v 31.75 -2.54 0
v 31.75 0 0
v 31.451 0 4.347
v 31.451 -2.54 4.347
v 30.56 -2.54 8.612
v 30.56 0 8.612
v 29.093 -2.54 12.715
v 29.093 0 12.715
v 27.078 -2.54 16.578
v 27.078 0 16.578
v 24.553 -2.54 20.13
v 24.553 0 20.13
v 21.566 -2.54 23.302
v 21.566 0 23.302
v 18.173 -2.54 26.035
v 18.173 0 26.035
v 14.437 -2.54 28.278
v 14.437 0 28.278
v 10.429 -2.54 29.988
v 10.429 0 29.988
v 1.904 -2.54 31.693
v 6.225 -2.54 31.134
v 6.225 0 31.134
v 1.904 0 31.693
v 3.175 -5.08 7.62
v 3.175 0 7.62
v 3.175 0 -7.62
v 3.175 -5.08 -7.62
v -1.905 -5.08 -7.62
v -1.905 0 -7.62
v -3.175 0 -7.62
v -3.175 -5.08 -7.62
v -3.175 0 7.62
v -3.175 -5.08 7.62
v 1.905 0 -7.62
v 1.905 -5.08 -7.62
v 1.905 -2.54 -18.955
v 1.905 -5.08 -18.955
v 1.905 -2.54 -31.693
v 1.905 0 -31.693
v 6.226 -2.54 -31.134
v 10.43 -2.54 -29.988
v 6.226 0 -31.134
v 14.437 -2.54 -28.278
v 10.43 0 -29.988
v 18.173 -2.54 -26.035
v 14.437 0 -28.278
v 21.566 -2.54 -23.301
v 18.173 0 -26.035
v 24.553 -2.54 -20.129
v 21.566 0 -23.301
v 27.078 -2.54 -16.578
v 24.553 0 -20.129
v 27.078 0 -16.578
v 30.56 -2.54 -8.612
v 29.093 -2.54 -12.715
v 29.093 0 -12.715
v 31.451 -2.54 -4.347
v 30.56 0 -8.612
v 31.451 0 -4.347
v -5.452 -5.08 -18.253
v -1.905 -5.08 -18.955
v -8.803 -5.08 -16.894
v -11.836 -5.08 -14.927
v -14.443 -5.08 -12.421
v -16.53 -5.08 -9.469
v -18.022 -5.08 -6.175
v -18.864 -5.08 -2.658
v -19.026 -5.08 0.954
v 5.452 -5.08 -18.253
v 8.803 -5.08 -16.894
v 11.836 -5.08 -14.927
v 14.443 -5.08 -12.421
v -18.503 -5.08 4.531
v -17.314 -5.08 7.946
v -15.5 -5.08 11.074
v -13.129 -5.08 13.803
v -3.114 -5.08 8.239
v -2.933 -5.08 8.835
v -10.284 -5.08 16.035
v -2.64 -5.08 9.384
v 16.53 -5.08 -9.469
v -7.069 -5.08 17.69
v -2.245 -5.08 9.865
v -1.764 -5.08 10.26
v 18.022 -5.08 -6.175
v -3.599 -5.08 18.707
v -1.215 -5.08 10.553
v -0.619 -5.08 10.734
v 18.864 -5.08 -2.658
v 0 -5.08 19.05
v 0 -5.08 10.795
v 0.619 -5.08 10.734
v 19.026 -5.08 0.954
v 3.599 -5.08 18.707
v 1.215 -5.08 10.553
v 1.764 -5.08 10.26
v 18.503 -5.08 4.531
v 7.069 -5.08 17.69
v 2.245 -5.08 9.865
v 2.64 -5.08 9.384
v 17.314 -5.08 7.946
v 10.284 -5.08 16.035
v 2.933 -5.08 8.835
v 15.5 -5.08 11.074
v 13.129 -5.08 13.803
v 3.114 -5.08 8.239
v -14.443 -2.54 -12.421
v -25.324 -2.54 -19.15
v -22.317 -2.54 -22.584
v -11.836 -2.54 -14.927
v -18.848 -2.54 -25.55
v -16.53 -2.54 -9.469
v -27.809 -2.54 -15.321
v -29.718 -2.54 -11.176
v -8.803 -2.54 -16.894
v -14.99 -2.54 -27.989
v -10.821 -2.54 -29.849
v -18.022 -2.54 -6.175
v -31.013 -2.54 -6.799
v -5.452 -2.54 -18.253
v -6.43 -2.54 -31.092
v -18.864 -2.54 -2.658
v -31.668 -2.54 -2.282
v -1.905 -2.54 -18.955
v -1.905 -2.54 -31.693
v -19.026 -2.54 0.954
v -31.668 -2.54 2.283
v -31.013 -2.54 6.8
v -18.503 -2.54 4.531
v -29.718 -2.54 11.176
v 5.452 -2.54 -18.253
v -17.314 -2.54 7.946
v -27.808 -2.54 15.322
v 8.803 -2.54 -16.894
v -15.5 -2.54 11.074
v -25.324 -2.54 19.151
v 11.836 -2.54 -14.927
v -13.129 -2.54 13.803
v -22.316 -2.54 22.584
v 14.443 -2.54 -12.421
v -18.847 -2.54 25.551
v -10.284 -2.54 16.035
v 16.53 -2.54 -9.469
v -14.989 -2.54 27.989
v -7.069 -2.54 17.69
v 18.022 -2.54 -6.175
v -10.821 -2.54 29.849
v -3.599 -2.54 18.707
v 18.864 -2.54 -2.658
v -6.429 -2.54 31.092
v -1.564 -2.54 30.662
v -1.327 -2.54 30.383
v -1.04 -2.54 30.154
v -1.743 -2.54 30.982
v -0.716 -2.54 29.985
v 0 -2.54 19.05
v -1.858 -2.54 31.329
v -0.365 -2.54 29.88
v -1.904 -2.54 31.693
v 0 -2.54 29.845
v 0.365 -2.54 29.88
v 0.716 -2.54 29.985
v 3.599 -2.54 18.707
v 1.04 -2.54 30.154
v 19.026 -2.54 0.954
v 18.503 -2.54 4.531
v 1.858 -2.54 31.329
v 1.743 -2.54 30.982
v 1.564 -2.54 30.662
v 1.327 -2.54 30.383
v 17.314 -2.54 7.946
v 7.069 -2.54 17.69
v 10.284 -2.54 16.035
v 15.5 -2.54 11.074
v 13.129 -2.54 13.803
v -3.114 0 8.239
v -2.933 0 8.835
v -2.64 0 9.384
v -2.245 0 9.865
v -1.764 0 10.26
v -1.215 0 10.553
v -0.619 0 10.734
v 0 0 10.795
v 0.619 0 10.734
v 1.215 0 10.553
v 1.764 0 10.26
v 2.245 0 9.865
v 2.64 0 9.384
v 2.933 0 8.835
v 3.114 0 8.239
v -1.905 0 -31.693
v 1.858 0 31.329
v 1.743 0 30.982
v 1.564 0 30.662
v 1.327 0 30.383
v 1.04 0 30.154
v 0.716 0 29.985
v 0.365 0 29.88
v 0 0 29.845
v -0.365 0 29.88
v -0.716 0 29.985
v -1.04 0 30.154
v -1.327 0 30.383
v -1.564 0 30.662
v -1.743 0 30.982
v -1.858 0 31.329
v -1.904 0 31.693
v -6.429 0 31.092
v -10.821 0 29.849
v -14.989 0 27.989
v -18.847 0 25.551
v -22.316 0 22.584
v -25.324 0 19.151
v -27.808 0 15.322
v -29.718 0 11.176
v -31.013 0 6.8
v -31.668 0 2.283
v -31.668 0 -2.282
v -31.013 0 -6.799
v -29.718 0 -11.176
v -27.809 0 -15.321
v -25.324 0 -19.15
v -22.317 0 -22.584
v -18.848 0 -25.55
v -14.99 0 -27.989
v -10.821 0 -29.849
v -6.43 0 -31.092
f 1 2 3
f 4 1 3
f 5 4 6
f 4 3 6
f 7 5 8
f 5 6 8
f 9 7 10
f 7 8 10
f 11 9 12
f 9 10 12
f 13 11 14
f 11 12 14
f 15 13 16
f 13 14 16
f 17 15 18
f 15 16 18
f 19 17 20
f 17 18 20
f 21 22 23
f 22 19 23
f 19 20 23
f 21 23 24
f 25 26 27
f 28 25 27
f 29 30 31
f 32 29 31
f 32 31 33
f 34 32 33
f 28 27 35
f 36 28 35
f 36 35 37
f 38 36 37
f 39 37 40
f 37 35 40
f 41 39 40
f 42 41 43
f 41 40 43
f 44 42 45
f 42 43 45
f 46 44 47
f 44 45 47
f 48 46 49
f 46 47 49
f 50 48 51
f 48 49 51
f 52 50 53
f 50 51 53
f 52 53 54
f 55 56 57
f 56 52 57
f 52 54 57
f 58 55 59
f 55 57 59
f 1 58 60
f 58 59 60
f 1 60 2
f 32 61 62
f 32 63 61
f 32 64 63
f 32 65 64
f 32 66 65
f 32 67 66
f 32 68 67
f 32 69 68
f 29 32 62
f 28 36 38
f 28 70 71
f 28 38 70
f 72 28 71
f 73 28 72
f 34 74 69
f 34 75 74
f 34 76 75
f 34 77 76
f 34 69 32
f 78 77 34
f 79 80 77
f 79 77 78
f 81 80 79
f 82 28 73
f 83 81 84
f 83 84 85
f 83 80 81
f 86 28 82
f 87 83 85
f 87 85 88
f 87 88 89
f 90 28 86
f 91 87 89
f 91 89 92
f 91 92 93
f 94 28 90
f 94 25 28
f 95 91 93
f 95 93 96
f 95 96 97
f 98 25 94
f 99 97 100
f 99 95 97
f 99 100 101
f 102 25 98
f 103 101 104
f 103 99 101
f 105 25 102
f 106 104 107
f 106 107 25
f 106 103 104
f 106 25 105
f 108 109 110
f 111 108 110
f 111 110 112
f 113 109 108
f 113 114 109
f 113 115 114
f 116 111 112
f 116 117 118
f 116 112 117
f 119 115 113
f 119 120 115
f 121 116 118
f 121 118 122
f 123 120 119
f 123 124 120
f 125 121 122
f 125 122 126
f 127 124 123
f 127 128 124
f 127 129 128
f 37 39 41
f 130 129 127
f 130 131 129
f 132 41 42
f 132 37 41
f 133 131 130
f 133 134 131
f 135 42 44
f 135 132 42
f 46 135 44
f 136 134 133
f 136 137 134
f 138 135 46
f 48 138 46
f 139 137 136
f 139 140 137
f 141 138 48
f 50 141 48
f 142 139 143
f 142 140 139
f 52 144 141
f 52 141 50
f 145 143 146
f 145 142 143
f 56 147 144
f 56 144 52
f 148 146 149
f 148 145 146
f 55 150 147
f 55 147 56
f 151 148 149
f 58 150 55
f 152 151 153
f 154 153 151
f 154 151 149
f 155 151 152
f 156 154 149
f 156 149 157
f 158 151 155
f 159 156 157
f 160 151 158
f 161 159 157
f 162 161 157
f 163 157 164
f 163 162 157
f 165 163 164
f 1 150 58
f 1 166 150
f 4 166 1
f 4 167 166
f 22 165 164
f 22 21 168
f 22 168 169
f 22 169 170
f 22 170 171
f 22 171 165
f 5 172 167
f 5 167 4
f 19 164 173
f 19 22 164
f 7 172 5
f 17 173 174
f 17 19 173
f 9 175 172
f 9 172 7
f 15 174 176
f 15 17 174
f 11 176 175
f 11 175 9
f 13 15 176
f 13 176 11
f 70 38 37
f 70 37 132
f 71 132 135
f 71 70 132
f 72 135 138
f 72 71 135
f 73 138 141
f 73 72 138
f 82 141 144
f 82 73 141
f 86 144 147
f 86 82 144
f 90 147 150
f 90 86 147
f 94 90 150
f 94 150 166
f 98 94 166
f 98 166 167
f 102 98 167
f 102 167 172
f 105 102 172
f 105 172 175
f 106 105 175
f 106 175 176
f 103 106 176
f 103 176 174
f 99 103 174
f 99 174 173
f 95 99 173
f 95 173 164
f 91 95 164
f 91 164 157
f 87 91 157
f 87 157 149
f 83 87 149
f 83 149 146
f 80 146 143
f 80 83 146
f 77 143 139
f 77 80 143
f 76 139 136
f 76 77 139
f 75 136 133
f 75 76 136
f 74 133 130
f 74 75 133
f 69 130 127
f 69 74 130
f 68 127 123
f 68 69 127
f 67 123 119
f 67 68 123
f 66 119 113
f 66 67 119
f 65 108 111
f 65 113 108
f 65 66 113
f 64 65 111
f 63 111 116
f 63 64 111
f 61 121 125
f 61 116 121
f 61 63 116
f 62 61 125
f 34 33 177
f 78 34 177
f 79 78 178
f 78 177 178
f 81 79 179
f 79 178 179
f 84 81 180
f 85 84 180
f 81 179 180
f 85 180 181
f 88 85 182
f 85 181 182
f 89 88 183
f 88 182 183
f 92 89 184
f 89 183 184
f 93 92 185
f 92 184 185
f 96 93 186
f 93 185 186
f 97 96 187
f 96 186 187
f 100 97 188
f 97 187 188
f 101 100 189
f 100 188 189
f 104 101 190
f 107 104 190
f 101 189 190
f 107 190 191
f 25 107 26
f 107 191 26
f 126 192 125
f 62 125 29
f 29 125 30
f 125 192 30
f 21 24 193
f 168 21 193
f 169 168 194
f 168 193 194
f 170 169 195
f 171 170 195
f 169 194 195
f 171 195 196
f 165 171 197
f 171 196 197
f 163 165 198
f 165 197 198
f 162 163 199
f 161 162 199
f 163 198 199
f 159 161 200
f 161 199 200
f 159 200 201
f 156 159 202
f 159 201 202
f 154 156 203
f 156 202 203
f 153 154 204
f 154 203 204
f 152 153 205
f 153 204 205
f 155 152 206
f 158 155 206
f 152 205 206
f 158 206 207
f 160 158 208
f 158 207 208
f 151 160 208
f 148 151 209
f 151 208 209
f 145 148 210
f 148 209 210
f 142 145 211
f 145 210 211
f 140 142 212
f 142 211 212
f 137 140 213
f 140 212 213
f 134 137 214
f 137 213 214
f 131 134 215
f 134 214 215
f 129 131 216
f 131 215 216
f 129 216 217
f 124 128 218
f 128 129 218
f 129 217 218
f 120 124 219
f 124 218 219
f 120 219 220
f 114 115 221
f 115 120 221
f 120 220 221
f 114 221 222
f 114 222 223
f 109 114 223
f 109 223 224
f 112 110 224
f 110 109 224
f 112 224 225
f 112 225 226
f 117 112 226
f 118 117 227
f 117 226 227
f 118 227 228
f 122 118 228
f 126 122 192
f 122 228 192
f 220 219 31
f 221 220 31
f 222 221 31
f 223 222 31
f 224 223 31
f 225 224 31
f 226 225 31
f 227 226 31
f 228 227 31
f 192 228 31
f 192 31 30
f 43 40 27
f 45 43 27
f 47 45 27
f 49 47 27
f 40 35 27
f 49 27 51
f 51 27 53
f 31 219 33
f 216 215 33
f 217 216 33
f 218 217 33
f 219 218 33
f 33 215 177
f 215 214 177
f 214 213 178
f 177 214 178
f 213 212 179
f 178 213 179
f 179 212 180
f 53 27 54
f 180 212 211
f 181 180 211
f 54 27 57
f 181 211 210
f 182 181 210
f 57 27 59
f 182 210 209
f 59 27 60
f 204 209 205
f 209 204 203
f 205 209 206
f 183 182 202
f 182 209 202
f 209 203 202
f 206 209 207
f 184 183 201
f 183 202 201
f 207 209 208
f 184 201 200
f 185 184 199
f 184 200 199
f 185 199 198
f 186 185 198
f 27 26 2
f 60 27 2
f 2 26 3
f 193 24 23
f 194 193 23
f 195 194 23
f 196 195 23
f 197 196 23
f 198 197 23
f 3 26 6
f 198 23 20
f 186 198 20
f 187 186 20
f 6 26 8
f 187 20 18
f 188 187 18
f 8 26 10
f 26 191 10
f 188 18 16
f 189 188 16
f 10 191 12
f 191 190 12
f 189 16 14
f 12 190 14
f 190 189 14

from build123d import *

# Parameters (mm, degrees)
F1_DEPTH = 5.08
F2_R     = 76.2
F2_R_2   = 19.05
F3_DEPTH = 2.54


with BuildPart() as f1:
    # F0 (on Front) → F1 (new body)
    with BuildSketch(Plane.XZ):
        with BuildLine():
            ThreePointArc((1.905, -31.692798), (23.114349, -21.766703), (31.75, 0))
            ThreePointArc((31.75, 0), (23.114054, 21.767016), (1.904143, 31.69285))
            ThreePointArc((1.904143, 31.69285), (0, 29.845), (-1.904143, 31.69285))
            ThreePointArc((-1.904143, 31.69285), (-31.75, 0.000429), (-1.905, -31.692798))
            Line((-1.905, -31.692798), (-1.905, -7.62))
            Line((-1.905, -7.62), (-3.175, -7.62))
            Line((-3.175, -7.62), (-3.175, 7.62))
            ThreePointArc((-3.175, 7.62), (0, 10.795), (3.175, 7.62))
            Line((3.175, 7.62), (3.175, -7.62))
            Line((3.175, -7.62), (1.905, -7.62))
            Line((1.905, -7.62), (1.905, -31.692798))
        make_face()
    extrude(amount=F1_DEPTH)

    # F2 (on face) → F3 (cut)
    with BuildSketch(Plane.XZ.offset(5.08)):
        Circle(F2_R)
        Circle(F2_R_2, mode=Mode.SUBTRACT)
    extrude(amount=-F3_DEPTH, mode=Mode.SUBTRACT)


solid = f1.part
